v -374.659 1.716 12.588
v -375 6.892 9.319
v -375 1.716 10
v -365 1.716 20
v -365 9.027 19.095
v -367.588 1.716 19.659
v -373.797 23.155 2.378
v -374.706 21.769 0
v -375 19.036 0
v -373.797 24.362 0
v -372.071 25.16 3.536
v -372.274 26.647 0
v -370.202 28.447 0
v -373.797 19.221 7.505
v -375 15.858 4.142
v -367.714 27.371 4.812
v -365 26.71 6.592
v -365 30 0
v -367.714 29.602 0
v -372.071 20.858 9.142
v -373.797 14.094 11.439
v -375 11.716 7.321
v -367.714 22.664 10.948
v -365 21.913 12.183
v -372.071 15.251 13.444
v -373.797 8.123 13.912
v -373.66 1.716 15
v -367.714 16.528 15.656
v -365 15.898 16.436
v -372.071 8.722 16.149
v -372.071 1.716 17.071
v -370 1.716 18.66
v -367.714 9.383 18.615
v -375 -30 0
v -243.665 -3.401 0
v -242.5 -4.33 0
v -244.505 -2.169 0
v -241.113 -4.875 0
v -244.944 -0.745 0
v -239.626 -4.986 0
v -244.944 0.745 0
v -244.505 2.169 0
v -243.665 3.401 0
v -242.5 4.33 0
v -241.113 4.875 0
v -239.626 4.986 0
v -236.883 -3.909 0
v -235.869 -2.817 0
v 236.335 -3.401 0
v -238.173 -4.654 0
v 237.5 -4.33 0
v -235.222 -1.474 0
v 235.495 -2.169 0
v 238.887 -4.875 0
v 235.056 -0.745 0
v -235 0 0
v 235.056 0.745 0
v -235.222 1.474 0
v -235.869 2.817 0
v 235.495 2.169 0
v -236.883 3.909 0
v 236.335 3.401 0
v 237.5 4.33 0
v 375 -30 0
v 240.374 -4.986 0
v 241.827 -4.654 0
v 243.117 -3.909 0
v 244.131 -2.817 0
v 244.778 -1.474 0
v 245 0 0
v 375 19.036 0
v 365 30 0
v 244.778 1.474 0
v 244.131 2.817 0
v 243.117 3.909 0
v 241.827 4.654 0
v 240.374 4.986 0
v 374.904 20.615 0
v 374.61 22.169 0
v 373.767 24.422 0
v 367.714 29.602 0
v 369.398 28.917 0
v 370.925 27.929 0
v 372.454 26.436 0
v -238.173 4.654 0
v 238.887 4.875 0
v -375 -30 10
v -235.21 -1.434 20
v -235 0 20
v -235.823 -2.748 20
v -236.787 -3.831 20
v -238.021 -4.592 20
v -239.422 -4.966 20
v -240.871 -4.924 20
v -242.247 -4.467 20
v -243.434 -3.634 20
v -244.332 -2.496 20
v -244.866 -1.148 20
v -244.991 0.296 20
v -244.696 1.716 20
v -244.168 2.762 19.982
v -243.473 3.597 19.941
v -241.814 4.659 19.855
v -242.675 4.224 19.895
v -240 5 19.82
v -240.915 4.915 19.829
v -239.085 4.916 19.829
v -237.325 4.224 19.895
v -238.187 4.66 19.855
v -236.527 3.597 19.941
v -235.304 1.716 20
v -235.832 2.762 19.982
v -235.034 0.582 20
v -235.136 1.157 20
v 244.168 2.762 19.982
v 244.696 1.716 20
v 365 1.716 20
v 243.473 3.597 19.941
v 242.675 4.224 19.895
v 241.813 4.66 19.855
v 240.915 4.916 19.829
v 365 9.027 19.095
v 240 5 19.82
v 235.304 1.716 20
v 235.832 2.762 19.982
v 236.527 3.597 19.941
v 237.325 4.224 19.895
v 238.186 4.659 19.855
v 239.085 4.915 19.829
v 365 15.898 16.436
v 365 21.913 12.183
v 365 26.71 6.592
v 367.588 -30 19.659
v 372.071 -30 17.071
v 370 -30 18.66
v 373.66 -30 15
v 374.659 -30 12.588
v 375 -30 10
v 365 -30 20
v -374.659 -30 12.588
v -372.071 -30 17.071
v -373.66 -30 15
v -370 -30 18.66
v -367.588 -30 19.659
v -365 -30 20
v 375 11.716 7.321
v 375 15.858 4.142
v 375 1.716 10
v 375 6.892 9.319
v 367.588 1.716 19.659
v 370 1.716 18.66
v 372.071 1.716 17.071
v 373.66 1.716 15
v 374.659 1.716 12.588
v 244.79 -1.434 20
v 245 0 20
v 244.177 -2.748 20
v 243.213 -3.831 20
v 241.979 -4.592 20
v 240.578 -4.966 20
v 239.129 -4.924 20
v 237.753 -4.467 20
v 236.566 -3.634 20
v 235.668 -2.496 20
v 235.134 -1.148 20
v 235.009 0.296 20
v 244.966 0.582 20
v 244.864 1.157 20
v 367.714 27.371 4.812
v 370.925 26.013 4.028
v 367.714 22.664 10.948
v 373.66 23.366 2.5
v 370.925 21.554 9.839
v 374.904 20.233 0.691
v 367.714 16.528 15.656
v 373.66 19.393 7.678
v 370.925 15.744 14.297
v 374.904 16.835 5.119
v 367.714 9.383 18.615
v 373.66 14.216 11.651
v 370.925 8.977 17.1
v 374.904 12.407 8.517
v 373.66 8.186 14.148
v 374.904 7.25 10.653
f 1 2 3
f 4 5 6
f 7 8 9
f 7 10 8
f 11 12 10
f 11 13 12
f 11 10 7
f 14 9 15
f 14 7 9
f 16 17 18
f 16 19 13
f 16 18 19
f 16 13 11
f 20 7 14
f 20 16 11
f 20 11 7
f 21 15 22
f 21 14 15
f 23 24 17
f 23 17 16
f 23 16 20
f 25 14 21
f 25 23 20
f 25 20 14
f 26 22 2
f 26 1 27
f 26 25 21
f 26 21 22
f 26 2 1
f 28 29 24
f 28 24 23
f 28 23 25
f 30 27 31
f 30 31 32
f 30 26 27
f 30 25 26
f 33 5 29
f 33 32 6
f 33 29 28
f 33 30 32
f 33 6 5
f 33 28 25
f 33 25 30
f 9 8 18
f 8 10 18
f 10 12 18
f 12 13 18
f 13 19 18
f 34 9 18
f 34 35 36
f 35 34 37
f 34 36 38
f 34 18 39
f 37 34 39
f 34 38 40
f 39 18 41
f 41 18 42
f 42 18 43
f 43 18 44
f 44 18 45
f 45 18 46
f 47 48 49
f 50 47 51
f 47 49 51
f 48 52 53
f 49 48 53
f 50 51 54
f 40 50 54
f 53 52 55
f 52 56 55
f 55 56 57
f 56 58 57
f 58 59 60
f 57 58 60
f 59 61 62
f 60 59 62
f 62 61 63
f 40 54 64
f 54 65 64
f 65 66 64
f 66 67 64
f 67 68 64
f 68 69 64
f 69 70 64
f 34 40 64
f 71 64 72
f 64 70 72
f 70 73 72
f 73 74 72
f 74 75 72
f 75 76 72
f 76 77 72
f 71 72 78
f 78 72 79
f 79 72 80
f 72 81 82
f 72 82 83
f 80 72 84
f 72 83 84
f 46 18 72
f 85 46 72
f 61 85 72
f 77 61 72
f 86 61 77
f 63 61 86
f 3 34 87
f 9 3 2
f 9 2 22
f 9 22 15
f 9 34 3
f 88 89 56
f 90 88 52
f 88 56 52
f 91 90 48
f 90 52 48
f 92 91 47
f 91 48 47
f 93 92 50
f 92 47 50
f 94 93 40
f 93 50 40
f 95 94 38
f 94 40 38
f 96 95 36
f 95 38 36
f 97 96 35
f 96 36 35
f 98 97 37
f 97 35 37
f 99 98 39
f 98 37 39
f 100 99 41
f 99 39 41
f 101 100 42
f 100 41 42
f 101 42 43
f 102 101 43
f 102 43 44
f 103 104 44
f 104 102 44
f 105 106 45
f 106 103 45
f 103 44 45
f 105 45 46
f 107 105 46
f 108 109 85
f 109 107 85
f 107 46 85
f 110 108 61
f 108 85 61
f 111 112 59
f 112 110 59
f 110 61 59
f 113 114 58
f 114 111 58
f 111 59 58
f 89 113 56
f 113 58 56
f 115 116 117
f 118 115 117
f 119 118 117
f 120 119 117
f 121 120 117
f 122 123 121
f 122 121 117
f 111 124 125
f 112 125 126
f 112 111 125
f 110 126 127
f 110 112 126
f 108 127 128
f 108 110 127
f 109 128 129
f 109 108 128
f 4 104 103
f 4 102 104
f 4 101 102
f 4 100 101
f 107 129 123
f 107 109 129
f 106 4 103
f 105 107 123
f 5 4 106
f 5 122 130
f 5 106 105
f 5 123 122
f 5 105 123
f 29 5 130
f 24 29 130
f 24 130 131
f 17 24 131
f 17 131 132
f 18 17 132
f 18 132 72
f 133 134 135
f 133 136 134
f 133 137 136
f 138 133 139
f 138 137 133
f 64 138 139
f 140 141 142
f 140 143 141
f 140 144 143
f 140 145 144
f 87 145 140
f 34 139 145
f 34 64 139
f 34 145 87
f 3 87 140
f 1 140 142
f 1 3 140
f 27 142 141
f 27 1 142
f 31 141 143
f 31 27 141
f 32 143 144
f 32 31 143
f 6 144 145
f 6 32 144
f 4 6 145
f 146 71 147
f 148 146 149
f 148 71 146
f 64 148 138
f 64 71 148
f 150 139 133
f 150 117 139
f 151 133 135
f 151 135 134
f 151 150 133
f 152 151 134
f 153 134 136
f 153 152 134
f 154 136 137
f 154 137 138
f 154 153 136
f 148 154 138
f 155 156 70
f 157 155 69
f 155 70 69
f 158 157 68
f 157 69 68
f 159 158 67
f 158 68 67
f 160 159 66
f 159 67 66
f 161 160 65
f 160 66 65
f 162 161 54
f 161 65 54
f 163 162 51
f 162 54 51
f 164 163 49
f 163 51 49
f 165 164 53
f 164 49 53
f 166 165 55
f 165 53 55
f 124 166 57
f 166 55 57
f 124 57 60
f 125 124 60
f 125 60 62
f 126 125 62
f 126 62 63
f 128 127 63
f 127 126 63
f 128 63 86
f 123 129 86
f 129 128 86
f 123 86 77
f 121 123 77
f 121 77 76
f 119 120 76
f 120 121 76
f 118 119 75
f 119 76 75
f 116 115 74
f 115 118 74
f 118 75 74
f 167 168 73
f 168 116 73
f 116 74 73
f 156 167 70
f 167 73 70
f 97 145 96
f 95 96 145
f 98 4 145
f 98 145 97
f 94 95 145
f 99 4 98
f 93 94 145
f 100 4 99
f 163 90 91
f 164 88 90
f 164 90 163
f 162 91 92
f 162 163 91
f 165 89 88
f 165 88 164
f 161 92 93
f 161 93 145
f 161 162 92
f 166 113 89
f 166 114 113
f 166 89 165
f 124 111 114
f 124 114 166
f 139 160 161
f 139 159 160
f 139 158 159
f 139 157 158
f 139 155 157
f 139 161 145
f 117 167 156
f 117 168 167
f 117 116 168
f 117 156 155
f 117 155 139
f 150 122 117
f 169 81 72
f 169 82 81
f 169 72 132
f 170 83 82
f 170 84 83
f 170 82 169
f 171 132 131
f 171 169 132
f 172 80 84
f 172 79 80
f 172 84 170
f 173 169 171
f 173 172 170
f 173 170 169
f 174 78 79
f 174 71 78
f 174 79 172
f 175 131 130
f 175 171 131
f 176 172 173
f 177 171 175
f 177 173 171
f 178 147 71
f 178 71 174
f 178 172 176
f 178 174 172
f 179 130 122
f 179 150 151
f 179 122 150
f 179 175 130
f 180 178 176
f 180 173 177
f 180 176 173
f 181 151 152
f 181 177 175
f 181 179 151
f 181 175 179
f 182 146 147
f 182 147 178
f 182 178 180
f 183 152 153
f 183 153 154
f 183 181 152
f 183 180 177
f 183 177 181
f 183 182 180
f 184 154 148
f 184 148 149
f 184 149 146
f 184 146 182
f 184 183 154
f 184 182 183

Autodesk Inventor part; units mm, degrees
ref_plane "YZ Plane" through (0, 0, 0) normal (1, 0, 0) x (0, 1, 0)
ref_plane "XZ Plane" through (0, 0, 0) normal (0, 1, 0) x (-1, 0, 0)
ref_plane "XY Plane" through (0, 0, 0) normal (0, 0, 1) x (1, 0, 0)
sketch "Sketch1" plane through (0, 0, 0) normal (0, 0, 1) x (1, 0, 0)
  line L0 (-375, 30) -> (375, 30)
  line L1 (375, 30) -> (375, -30)
  line L2 (375, -30) -> (-375, -30)
  line L3 (-375, -30) -> (-375, 30)
  circle A0 centre (-240, 0) radius 5
  circle A1 centre (240, 0) radius 5
  point P0 (0, 0)
  dimension "d0" = 750
  dimension "d1" = 60
  dimension "d3" = 10
extrude "Extrusion1" add sketch "Sketch1" along normal blind 20
fillet "Fillet1" radius 30 1 edges at (0, 30, 20)
fillet "Fillet2" radius 10 4 edges at (-375, -14.1421, 20) (-375, 19.0362, 14.4949) (375, 19.0362, 14.4949) (375, -14.1421, 20)
properties part number "Topo_Aerofoil"
